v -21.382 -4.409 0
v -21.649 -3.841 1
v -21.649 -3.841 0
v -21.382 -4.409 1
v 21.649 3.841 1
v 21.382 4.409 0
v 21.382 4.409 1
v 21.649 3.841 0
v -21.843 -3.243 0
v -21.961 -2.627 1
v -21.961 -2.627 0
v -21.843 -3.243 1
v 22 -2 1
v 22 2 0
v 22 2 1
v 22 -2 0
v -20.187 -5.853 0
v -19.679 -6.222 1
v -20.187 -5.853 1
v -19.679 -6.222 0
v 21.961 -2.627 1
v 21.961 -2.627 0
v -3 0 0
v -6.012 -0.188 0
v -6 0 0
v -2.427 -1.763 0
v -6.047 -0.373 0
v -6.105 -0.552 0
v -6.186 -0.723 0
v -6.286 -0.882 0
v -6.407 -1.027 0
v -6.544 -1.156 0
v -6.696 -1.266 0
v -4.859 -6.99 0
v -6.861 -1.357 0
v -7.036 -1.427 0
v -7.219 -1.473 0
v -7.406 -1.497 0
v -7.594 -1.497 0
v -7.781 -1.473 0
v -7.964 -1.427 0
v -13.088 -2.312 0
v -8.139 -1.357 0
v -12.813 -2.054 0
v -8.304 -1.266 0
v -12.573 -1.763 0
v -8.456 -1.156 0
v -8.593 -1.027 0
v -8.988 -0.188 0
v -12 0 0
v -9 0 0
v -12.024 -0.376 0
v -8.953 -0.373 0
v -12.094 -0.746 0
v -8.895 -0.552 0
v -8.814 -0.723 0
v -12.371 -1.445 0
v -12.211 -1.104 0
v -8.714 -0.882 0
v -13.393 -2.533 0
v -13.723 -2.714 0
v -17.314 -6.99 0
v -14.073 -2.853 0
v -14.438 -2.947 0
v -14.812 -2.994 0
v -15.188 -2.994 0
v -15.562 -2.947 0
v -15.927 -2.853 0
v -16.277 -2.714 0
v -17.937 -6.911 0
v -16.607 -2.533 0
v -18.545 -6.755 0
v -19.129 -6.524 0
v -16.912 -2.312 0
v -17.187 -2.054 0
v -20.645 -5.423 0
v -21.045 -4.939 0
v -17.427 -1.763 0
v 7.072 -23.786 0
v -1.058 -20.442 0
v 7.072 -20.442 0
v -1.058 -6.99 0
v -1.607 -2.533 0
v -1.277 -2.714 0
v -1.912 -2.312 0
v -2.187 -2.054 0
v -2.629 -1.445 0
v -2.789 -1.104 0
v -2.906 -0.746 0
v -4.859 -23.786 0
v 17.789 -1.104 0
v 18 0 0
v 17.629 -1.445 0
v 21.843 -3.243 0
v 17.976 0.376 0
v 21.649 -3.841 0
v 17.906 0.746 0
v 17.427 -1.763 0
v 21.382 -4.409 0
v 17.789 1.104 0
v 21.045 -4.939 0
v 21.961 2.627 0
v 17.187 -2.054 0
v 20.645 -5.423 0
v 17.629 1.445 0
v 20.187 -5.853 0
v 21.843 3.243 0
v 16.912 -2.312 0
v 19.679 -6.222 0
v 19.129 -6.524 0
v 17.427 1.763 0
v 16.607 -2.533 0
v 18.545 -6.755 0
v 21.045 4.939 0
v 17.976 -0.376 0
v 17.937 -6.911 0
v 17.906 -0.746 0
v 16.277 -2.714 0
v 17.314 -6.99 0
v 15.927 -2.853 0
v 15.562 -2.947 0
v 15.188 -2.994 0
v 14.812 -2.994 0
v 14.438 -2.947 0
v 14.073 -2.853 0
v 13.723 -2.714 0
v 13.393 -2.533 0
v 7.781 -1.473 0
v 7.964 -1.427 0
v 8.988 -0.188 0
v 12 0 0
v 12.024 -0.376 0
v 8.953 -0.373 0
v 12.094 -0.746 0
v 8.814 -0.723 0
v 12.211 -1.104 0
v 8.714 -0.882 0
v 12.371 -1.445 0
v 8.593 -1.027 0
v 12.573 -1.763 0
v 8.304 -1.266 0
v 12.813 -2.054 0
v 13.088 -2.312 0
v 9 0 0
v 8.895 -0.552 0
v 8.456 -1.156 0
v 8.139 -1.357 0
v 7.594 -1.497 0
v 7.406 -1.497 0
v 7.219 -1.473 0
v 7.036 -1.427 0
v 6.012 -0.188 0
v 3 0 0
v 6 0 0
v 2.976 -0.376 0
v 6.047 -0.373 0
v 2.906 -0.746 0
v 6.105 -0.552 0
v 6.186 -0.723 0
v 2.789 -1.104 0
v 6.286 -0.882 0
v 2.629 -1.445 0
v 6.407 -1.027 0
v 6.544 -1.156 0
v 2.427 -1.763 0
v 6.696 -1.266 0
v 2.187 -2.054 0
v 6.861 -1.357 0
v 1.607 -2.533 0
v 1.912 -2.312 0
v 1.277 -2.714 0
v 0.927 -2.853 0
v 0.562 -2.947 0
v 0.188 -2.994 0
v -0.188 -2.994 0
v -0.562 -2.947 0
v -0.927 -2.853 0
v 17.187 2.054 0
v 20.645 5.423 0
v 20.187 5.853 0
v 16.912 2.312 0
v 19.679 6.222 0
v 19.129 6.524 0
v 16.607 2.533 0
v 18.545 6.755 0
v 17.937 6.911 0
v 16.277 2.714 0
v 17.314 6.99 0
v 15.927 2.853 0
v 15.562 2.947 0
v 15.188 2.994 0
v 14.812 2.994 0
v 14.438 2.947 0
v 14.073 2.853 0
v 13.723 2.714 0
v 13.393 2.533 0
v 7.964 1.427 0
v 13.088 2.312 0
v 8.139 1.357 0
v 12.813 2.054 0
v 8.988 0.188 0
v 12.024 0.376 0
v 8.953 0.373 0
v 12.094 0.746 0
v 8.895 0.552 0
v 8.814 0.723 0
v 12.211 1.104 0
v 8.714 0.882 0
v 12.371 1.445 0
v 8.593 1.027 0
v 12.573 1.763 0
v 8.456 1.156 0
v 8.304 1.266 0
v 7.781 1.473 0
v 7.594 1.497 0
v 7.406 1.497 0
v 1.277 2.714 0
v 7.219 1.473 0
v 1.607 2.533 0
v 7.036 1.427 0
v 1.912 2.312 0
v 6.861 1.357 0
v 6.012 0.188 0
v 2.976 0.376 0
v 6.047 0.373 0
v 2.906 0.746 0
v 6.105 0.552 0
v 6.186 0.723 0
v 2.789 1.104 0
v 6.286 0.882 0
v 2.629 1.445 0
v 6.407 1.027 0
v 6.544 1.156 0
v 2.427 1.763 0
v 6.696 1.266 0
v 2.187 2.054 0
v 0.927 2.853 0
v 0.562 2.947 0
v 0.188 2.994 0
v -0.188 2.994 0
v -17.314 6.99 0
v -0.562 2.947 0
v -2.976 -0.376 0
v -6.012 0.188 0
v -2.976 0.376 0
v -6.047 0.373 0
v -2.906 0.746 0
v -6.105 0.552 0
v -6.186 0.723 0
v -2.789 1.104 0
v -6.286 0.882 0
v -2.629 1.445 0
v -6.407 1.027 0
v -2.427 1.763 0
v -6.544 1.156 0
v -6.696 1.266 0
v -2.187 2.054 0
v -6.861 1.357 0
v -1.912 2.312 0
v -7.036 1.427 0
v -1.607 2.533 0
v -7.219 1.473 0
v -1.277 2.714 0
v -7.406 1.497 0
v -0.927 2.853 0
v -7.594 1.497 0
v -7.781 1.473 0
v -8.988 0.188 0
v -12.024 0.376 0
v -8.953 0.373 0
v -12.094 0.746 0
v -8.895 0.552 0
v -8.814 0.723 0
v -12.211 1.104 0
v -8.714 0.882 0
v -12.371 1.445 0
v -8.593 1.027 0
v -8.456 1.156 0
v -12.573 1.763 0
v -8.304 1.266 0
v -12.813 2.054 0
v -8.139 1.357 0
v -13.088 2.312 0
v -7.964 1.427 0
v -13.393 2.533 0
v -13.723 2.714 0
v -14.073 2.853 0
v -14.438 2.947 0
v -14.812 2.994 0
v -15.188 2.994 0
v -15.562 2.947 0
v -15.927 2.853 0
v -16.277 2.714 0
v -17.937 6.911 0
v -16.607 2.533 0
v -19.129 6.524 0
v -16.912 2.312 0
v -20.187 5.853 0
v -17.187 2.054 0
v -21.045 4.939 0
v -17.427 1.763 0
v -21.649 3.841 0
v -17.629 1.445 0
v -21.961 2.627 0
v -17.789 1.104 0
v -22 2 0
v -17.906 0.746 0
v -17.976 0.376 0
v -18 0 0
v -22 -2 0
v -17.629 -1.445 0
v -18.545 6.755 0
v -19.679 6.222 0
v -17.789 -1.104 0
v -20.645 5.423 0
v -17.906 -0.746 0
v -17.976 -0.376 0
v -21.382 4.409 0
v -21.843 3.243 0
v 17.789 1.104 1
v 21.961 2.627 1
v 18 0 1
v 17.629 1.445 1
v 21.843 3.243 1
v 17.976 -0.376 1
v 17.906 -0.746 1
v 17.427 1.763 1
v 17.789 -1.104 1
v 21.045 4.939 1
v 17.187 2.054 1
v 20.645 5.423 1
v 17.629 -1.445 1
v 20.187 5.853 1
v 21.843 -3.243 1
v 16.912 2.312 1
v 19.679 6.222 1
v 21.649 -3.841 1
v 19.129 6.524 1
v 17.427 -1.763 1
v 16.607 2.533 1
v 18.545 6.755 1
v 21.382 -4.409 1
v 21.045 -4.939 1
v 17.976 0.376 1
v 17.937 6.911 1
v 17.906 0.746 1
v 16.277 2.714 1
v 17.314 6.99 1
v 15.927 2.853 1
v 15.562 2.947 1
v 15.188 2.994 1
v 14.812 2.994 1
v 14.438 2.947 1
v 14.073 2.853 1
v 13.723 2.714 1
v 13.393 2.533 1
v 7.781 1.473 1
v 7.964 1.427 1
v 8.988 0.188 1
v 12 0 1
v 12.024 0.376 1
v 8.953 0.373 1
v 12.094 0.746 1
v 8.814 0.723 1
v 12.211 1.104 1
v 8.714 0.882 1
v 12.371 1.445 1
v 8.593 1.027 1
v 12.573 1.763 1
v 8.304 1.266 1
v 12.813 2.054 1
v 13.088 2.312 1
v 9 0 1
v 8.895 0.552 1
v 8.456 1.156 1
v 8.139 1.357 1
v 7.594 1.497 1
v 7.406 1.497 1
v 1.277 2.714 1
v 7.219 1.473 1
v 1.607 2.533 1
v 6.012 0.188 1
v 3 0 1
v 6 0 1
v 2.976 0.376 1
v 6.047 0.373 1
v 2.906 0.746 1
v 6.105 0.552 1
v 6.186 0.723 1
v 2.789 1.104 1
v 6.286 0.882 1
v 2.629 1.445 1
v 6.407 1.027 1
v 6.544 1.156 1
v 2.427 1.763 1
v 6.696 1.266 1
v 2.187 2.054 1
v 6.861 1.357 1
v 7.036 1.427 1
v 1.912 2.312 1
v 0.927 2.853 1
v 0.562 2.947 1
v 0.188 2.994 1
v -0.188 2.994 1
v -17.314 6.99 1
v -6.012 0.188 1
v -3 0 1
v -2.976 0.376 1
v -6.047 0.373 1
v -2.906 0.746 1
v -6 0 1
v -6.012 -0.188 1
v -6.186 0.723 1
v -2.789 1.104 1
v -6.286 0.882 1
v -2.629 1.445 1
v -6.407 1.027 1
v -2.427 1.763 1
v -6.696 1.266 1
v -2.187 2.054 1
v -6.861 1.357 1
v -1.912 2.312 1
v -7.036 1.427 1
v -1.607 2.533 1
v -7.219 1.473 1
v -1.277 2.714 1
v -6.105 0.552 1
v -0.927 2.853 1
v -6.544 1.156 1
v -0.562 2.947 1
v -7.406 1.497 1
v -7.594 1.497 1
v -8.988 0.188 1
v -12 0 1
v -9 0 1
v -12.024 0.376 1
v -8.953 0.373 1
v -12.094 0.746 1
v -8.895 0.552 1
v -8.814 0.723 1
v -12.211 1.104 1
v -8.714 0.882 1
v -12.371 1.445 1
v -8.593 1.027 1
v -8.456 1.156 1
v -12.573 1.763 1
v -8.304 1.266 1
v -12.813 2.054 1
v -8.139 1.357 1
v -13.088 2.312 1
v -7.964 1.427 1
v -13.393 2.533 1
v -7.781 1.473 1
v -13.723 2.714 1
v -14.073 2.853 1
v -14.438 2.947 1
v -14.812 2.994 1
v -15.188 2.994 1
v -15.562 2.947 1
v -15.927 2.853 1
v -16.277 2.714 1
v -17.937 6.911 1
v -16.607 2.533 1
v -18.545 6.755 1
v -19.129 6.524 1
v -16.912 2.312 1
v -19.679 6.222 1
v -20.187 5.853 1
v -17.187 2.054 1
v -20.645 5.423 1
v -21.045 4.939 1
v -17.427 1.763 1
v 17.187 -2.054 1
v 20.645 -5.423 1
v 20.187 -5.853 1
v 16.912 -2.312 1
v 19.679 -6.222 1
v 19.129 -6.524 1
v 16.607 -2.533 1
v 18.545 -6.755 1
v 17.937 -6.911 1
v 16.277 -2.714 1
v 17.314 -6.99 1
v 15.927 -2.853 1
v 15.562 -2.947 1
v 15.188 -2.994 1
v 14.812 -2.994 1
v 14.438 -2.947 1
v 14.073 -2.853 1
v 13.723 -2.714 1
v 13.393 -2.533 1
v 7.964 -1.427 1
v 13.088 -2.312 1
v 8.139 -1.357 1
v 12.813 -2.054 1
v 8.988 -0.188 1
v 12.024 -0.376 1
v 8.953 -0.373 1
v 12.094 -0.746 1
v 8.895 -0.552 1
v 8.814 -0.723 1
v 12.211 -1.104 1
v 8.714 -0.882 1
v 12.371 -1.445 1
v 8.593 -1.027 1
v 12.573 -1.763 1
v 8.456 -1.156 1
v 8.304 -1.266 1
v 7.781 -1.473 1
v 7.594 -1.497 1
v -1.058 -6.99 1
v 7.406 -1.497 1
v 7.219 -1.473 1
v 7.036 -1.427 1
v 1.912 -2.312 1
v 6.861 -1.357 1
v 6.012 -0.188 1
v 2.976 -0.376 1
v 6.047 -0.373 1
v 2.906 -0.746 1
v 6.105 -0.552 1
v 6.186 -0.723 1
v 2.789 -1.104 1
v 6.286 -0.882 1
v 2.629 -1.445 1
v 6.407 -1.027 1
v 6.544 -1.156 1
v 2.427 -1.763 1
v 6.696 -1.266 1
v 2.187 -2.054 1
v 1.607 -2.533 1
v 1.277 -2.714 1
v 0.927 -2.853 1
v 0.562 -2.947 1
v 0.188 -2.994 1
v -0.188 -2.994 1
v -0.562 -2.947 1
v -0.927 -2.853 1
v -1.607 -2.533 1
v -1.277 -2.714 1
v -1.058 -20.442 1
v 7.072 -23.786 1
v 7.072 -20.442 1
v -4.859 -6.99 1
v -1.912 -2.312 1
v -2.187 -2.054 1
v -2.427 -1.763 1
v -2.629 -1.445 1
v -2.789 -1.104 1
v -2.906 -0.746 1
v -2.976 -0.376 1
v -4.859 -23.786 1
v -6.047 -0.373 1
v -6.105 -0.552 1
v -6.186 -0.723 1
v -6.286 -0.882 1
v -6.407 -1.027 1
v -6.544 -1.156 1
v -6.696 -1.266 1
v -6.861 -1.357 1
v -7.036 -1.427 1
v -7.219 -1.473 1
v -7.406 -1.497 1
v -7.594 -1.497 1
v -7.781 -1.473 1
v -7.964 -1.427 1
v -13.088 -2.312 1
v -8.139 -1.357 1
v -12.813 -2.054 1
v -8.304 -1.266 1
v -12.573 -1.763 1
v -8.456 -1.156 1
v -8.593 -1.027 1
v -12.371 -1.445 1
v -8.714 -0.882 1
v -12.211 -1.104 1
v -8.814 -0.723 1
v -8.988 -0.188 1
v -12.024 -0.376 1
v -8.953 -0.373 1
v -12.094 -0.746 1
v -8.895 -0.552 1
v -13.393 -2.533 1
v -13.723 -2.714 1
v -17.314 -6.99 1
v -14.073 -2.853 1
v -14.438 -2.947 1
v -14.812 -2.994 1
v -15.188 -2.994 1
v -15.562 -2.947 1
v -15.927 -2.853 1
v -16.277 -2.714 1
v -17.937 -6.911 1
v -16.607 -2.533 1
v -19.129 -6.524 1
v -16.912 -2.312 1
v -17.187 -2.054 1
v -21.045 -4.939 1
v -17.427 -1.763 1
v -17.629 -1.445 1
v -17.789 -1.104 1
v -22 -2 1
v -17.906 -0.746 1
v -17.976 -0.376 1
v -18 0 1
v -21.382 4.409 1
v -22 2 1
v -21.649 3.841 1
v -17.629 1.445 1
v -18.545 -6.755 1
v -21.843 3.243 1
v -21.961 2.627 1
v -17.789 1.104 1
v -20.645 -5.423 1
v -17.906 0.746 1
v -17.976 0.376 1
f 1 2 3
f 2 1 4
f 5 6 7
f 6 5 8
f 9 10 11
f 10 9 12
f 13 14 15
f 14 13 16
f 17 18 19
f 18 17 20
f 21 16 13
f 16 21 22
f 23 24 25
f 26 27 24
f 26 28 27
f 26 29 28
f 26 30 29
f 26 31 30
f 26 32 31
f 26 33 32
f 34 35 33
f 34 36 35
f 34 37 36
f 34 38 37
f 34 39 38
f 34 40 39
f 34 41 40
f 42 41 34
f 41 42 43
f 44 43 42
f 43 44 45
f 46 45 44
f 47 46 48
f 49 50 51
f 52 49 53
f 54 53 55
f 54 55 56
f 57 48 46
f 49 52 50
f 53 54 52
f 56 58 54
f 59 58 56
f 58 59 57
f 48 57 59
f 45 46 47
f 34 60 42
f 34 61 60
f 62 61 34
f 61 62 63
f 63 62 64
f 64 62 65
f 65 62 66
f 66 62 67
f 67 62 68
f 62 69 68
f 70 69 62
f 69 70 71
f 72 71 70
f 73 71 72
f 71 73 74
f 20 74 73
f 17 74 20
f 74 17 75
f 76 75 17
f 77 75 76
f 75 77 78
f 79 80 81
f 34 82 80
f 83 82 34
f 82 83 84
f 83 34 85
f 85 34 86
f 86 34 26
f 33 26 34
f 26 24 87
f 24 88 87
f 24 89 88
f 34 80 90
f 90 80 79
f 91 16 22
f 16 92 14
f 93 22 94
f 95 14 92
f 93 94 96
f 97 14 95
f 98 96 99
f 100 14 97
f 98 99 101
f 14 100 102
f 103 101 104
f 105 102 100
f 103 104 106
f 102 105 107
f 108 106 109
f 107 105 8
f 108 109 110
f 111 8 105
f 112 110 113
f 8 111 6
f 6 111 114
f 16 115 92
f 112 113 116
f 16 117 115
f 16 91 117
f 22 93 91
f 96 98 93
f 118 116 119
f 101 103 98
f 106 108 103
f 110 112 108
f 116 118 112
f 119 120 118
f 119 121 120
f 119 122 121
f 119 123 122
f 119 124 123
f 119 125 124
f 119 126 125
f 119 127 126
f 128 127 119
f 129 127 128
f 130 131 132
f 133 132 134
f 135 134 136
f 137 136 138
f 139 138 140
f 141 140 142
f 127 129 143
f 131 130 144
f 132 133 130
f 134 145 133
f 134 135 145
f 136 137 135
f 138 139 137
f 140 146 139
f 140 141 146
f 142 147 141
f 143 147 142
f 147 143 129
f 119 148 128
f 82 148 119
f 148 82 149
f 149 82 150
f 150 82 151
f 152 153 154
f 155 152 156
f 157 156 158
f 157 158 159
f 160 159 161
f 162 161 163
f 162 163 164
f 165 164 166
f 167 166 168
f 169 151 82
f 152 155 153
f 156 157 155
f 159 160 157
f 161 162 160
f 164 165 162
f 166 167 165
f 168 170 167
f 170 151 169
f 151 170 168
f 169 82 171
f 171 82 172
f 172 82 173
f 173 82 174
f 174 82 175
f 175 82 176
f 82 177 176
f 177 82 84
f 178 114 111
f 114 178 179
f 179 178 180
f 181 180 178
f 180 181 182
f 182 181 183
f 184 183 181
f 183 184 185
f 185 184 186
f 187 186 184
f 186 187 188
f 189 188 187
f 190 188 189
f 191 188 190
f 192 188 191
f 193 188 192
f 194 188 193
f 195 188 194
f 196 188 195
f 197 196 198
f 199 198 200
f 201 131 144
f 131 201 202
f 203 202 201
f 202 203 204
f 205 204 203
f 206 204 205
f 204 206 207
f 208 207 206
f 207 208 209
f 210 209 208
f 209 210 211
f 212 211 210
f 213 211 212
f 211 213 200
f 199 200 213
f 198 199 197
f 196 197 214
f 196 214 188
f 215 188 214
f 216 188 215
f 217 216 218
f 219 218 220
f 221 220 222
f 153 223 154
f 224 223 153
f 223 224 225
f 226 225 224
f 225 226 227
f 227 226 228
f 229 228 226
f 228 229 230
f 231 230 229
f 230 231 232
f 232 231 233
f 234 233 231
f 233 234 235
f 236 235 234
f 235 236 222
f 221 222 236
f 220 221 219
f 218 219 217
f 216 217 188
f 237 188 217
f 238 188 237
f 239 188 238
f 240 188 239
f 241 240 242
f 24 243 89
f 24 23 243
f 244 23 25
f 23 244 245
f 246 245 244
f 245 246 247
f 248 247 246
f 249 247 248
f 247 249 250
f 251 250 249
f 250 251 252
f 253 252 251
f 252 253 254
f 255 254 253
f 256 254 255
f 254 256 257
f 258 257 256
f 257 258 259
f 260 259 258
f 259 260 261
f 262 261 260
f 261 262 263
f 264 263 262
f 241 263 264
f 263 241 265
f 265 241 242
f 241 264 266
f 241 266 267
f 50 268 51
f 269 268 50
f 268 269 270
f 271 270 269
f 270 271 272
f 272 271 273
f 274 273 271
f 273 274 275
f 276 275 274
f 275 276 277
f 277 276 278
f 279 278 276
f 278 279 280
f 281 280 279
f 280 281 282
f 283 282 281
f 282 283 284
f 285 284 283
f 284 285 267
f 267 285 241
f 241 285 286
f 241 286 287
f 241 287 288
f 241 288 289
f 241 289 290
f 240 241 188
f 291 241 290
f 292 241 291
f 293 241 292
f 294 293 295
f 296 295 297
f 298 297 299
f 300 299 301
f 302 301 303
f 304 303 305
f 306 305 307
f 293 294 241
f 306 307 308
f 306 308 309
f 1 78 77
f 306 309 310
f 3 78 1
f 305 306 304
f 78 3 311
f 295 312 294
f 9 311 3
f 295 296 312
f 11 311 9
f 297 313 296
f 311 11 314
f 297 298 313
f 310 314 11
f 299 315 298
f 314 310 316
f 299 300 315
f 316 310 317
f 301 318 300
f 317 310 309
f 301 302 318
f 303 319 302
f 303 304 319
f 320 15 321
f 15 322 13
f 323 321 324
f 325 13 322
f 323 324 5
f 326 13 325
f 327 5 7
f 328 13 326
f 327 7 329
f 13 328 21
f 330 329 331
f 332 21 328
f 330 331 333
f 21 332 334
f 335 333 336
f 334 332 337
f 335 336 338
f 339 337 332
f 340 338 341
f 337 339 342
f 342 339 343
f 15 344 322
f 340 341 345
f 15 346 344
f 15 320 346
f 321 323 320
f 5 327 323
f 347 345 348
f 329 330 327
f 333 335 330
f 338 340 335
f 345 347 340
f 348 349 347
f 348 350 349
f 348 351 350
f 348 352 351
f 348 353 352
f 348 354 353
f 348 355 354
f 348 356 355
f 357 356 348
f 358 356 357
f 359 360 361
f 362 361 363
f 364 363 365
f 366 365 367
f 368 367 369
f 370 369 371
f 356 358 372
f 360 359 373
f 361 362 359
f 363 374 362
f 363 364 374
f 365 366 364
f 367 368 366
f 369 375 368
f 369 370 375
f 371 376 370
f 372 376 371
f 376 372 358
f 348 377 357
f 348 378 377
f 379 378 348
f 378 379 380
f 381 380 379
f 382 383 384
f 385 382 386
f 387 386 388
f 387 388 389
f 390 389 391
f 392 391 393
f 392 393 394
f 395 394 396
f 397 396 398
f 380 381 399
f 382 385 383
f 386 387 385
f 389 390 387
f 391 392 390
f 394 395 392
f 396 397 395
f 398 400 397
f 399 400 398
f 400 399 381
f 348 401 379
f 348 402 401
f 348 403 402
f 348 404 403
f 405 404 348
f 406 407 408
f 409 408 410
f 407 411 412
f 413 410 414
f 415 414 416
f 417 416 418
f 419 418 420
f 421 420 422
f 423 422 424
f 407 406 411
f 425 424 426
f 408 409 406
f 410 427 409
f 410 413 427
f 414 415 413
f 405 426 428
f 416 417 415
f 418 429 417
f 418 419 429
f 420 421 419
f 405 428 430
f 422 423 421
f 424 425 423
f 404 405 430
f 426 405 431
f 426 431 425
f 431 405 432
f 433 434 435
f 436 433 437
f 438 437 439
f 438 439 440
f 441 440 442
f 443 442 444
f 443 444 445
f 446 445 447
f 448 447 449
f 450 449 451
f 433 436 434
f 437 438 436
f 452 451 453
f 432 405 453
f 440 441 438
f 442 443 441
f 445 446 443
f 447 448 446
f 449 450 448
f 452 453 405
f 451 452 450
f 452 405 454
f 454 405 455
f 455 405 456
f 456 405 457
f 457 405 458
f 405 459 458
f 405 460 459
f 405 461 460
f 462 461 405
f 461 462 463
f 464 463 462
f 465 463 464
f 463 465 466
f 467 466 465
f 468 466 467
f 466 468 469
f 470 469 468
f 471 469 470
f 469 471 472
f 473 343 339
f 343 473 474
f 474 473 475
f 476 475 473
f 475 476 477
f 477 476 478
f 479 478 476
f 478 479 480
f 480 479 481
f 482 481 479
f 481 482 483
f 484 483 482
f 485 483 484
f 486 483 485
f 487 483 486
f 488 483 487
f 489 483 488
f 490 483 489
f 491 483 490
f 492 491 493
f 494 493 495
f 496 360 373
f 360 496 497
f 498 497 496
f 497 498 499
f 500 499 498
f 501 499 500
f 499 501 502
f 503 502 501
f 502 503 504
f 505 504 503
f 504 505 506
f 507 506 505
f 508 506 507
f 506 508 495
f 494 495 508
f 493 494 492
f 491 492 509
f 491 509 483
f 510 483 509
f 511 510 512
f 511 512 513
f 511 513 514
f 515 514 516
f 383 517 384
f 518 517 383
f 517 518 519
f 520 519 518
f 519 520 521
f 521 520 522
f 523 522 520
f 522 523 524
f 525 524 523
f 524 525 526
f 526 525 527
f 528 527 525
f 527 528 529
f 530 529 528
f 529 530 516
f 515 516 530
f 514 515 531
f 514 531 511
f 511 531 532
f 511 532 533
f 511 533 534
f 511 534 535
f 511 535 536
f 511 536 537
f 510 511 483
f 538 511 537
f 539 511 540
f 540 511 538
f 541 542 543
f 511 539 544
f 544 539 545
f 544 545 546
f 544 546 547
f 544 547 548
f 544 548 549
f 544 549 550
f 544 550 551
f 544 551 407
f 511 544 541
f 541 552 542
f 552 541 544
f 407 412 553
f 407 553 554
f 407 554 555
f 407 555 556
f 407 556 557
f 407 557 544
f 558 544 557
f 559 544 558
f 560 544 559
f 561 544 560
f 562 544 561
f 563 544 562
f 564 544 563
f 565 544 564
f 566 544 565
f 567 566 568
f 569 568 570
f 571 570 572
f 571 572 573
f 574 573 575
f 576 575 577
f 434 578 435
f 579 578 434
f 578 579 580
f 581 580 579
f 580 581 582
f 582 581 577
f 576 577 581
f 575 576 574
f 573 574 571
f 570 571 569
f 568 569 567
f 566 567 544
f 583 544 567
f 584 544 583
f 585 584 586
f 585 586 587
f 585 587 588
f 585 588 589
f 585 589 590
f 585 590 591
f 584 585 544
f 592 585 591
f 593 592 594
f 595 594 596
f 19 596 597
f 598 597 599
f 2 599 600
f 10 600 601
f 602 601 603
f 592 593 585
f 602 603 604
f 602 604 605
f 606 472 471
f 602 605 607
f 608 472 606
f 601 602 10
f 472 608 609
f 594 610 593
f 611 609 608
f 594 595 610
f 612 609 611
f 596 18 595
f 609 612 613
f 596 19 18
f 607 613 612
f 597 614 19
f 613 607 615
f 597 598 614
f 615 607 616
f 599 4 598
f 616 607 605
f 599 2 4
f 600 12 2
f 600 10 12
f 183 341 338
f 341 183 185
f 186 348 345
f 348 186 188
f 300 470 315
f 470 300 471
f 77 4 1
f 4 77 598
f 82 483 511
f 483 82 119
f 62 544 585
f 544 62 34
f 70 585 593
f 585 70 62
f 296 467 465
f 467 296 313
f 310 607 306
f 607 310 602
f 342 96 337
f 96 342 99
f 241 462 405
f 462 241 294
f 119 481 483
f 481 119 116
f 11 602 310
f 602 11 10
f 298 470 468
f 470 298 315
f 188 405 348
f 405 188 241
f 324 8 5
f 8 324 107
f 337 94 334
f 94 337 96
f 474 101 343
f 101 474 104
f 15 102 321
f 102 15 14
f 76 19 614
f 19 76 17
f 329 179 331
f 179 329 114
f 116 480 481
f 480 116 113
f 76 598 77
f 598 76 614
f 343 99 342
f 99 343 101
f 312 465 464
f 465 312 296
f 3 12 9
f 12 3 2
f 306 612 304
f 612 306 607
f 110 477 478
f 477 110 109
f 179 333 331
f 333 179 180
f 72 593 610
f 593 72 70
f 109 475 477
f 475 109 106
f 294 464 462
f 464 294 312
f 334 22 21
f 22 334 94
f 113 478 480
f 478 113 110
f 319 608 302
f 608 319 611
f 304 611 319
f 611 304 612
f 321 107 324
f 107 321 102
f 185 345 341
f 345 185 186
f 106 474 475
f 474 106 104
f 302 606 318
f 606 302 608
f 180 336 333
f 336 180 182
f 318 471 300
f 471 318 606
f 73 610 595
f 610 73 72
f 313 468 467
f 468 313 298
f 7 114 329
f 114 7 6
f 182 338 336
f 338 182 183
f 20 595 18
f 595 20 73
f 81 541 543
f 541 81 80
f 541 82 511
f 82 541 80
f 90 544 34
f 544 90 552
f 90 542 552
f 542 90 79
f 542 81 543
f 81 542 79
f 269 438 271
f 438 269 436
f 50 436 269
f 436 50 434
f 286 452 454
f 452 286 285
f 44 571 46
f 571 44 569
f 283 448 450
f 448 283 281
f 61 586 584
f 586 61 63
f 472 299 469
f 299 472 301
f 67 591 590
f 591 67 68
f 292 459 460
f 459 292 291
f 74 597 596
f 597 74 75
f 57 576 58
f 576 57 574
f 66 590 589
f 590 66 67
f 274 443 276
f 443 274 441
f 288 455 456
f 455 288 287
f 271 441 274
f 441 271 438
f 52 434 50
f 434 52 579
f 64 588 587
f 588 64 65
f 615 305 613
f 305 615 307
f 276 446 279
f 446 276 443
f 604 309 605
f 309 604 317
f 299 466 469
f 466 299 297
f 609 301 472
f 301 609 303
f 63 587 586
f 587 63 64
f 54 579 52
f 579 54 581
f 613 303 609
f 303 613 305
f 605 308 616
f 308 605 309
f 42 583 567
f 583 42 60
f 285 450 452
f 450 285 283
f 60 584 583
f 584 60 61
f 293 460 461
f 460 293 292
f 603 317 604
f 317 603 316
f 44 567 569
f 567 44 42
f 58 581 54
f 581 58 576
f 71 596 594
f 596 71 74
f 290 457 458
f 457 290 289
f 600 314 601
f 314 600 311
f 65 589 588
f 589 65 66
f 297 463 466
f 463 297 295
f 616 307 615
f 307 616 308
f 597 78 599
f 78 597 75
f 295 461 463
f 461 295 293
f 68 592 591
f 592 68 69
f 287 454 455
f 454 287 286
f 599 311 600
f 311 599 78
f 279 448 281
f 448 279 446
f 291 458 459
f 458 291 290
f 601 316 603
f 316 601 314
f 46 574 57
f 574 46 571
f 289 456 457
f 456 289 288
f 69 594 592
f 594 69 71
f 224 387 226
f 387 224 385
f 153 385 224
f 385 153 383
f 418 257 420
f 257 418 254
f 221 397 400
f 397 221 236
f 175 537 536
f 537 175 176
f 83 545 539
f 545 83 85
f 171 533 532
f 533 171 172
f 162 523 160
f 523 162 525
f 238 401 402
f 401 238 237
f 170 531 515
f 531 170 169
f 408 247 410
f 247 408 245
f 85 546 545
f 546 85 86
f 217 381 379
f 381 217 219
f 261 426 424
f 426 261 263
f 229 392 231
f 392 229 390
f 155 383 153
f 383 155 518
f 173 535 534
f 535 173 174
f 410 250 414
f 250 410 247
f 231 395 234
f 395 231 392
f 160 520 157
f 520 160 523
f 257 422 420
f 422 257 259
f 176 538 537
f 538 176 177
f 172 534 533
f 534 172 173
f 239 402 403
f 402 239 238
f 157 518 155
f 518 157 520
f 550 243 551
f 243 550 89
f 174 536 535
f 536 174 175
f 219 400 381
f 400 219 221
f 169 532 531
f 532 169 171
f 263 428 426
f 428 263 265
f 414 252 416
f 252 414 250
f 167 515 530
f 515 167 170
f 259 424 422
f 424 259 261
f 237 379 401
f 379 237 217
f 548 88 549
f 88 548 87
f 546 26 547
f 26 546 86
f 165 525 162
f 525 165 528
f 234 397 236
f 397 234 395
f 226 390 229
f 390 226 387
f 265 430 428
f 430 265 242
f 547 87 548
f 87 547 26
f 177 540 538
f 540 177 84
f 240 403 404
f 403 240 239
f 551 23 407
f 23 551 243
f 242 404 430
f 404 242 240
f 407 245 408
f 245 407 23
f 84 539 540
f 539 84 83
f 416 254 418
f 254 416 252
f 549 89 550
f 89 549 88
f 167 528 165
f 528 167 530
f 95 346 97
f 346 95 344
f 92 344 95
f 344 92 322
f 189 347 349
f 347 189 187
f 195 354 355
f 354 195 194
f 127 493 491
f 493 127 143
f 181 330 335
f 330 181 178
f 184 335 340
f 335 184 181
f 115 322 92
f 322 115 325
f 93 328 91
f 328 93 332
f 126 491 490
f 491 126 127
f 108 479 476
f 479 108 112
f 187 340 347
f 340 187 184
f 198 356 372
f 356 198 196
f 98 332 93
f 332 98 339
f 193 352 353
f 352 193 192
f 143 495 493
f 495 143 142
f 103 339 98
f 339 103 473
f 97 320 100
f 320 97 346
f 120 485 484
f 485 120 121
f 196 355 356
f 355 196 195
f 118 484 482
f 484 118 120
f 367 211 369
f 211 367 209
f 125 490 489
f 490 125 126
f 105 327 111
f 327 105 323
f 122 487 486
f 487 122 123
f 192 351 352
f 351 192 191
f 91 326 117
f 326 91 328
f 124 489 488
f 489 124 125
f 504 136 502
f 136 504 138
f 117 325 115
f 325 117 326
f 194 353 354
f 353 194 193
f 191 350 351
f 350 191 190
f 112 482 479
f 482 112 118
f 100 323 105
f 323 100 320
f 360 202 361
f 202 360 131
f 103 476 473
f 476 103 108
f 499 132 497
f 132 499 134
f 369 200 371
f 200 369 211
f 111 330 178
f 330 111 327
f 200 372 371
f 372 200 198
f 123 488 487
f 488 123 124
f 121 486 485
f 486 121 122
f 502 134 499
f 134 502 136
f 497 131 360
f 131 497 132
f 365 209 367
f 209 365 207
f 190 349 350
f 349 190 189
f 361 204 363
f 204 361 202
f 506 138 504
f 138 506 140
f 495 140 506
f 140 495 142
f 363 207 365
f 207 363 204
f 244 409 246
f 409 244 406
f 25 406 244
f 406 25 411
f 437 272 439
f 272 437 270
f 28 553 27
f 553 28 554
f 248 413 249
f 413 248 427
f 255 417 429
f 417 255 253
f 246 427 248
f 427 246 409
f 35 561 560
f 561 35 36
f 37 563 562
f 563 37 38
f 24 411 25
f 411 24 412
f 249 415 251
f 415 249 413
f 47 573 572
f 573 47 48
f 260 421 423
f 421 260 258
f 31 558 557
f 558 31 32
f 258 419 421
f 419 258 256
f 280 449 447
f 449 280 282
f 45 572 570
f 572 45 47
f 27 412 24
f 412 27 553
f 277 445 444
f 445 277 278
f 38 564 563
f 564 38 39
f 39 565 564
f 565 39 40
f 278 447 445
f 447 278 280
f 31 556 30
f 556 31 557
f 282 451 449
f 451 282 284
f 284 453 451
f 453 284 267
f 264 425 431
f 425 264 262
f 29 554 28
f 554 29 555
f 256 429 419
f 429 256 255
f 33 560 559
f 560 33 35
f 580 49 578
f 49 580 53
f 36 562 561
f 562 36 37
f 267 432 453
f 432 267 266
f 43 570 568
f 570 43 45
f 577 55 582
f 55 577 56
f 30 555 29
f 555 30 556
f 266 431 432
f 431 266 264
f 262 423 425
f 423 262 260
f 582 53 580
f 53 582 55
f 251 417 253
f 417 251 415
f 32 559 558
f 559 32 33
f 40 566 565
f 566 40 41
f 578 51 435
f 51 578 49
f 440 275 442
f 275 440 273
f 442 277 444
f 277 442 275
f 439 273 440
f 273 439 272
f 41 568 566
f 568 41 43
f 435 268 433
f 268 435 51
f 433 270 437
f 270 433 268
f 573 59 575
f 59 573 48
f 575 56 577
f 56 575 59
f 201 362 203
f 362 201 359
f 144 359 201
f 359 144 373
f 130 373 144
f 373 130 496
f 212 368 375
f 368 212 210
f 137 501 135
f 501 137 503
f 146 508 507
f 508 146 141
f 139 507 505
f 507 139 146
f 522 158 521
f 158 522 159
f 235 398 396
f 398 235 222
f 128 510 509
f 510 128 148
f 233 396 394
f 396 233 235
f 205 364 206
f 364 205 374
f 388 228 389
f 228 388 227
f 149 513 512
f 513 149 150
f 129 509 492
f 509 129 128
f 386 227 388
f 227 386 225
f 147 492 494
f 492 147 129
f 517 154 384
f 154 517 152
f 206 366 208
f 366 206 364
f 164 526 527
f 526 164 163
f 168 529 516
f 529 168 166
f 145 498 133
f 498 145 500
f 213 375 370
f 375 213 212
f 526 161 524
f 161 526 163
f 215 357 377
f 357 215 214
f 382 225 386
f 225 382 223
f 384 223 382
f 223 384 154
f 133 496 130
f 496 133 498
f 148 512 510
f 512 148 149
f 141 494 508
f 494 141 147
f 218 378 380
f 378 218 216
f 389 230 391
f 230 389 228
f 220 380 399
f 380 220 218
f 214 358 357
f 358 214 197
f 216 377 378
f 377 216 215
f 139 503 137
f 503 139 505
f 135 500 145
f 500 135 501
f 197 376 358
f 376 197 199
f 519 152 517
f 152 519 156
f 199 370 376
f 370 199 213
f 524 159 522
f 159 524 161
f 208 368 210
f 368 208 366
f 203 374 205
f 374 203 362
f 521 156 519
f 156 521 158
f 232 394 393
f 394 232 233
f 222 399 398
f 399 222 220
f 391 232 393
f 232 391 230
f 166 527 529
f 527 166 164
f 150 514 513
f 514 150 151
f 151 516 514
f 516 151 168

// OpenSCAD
$fn = 50;


difference() {
	union() {
		*color(alpha = 1.0000000000, c = "gray") {
			translate(v = [0, 14, 0]) {
				linear_extrude(height = 1) {
					text(font = "Arial:style=Bold", halign = "center", size = 4.5000000000, text = "COMMENT description oobb_plate_shape_p_type_1_depth_3_width_1_thickness_l_extra_oobb_size", valign = "center");
				}
			}
		}
		hull() {
			translate(v = [-17.0000000000, 2.0000000000, 0]) {
				cylinder(h = 1, r = 5);
			}
			translate(v = [17.0000000000, 2.0000000000, 0]) {
				cylinder(h = 1, r = 5);
			}
			translate(v = [-17.0000000000, -2.0000000000, 0]) {
				cylinder(h = 1, r = 5);
			}
			translate(v = [17.0000000000, -2.0000000000, 0]) {
				cylinder(h = 1, r = 5);
			}
		}
		translate(v = [0, -5, 0]) {
			linear_extrude(height = 1) {
				text(font = "DejaVu Sans Mono:style=Bold", halign = "center", size = 19.0000000000, text = "L", valign = "top");
			}
		}
	}
	union() {
		*color(alpha = 1.0000000000, c = "gray") {
			translate(v = [0, 14, 0]) {
				linear_extrude(height = 1) {
					text(font = "Arial:style=Bold", halign = "center", size = 4.5000000000, text = "COMMENT description oobb_holes_shape_n_type_3_width_1_thickness_l_extra_oobb_size_1_height_'all'_holes_true_both_holes", valign = "center");
				}
			}
		}
		translate(v = [-15.0000000000, 0.0000000000, 0]) {
			translate(v = [0, 0, -50]) {
				cylinder(h = 100, r = 3.0000000000);
			}
		}
		translate(v = [0, 0, -50]) {
			cylinder(h = 100, r = 3.0000000000);
		}
		translate(v = [15.0000000000, 0.0000000000, 0]) {
			translate(v = [0, 0, -50]) {
				cylinder(h = 100, r = 3.0000000000);
			}
		}
		translate(v = [-15.0000000000, 0.0000000000, 0]) {
			translate(v = [0, 0, -50]) {
				cylinder(h = 100, r = 1.5000000000);
			}
		}
		translate(v = [-7.5000000000, 0.0000000000, 0]) {
			translate(v = [0, 0, -50]) {
				cylinder(h = 100, r = 1.5000000000);
			}
		}
		translate(v = [0, 0, -50]) {
			cylinder(h = 100, r = 1.5000000000);
		}
		translate(v = [7.5000000000, 0.0000000000, 0]) {
			translate(v = [0, 0, -50]) {
				cylinder(h = 100, r = 1.5000000000);
			}
		}
		translate(v = [15.0000000000, 0.0000000000, 0]) {
			translate(v = [0, 0, -50]) {
				cylinder(h = 100, r = 1.5000000000);
			}
		}
	}
}
